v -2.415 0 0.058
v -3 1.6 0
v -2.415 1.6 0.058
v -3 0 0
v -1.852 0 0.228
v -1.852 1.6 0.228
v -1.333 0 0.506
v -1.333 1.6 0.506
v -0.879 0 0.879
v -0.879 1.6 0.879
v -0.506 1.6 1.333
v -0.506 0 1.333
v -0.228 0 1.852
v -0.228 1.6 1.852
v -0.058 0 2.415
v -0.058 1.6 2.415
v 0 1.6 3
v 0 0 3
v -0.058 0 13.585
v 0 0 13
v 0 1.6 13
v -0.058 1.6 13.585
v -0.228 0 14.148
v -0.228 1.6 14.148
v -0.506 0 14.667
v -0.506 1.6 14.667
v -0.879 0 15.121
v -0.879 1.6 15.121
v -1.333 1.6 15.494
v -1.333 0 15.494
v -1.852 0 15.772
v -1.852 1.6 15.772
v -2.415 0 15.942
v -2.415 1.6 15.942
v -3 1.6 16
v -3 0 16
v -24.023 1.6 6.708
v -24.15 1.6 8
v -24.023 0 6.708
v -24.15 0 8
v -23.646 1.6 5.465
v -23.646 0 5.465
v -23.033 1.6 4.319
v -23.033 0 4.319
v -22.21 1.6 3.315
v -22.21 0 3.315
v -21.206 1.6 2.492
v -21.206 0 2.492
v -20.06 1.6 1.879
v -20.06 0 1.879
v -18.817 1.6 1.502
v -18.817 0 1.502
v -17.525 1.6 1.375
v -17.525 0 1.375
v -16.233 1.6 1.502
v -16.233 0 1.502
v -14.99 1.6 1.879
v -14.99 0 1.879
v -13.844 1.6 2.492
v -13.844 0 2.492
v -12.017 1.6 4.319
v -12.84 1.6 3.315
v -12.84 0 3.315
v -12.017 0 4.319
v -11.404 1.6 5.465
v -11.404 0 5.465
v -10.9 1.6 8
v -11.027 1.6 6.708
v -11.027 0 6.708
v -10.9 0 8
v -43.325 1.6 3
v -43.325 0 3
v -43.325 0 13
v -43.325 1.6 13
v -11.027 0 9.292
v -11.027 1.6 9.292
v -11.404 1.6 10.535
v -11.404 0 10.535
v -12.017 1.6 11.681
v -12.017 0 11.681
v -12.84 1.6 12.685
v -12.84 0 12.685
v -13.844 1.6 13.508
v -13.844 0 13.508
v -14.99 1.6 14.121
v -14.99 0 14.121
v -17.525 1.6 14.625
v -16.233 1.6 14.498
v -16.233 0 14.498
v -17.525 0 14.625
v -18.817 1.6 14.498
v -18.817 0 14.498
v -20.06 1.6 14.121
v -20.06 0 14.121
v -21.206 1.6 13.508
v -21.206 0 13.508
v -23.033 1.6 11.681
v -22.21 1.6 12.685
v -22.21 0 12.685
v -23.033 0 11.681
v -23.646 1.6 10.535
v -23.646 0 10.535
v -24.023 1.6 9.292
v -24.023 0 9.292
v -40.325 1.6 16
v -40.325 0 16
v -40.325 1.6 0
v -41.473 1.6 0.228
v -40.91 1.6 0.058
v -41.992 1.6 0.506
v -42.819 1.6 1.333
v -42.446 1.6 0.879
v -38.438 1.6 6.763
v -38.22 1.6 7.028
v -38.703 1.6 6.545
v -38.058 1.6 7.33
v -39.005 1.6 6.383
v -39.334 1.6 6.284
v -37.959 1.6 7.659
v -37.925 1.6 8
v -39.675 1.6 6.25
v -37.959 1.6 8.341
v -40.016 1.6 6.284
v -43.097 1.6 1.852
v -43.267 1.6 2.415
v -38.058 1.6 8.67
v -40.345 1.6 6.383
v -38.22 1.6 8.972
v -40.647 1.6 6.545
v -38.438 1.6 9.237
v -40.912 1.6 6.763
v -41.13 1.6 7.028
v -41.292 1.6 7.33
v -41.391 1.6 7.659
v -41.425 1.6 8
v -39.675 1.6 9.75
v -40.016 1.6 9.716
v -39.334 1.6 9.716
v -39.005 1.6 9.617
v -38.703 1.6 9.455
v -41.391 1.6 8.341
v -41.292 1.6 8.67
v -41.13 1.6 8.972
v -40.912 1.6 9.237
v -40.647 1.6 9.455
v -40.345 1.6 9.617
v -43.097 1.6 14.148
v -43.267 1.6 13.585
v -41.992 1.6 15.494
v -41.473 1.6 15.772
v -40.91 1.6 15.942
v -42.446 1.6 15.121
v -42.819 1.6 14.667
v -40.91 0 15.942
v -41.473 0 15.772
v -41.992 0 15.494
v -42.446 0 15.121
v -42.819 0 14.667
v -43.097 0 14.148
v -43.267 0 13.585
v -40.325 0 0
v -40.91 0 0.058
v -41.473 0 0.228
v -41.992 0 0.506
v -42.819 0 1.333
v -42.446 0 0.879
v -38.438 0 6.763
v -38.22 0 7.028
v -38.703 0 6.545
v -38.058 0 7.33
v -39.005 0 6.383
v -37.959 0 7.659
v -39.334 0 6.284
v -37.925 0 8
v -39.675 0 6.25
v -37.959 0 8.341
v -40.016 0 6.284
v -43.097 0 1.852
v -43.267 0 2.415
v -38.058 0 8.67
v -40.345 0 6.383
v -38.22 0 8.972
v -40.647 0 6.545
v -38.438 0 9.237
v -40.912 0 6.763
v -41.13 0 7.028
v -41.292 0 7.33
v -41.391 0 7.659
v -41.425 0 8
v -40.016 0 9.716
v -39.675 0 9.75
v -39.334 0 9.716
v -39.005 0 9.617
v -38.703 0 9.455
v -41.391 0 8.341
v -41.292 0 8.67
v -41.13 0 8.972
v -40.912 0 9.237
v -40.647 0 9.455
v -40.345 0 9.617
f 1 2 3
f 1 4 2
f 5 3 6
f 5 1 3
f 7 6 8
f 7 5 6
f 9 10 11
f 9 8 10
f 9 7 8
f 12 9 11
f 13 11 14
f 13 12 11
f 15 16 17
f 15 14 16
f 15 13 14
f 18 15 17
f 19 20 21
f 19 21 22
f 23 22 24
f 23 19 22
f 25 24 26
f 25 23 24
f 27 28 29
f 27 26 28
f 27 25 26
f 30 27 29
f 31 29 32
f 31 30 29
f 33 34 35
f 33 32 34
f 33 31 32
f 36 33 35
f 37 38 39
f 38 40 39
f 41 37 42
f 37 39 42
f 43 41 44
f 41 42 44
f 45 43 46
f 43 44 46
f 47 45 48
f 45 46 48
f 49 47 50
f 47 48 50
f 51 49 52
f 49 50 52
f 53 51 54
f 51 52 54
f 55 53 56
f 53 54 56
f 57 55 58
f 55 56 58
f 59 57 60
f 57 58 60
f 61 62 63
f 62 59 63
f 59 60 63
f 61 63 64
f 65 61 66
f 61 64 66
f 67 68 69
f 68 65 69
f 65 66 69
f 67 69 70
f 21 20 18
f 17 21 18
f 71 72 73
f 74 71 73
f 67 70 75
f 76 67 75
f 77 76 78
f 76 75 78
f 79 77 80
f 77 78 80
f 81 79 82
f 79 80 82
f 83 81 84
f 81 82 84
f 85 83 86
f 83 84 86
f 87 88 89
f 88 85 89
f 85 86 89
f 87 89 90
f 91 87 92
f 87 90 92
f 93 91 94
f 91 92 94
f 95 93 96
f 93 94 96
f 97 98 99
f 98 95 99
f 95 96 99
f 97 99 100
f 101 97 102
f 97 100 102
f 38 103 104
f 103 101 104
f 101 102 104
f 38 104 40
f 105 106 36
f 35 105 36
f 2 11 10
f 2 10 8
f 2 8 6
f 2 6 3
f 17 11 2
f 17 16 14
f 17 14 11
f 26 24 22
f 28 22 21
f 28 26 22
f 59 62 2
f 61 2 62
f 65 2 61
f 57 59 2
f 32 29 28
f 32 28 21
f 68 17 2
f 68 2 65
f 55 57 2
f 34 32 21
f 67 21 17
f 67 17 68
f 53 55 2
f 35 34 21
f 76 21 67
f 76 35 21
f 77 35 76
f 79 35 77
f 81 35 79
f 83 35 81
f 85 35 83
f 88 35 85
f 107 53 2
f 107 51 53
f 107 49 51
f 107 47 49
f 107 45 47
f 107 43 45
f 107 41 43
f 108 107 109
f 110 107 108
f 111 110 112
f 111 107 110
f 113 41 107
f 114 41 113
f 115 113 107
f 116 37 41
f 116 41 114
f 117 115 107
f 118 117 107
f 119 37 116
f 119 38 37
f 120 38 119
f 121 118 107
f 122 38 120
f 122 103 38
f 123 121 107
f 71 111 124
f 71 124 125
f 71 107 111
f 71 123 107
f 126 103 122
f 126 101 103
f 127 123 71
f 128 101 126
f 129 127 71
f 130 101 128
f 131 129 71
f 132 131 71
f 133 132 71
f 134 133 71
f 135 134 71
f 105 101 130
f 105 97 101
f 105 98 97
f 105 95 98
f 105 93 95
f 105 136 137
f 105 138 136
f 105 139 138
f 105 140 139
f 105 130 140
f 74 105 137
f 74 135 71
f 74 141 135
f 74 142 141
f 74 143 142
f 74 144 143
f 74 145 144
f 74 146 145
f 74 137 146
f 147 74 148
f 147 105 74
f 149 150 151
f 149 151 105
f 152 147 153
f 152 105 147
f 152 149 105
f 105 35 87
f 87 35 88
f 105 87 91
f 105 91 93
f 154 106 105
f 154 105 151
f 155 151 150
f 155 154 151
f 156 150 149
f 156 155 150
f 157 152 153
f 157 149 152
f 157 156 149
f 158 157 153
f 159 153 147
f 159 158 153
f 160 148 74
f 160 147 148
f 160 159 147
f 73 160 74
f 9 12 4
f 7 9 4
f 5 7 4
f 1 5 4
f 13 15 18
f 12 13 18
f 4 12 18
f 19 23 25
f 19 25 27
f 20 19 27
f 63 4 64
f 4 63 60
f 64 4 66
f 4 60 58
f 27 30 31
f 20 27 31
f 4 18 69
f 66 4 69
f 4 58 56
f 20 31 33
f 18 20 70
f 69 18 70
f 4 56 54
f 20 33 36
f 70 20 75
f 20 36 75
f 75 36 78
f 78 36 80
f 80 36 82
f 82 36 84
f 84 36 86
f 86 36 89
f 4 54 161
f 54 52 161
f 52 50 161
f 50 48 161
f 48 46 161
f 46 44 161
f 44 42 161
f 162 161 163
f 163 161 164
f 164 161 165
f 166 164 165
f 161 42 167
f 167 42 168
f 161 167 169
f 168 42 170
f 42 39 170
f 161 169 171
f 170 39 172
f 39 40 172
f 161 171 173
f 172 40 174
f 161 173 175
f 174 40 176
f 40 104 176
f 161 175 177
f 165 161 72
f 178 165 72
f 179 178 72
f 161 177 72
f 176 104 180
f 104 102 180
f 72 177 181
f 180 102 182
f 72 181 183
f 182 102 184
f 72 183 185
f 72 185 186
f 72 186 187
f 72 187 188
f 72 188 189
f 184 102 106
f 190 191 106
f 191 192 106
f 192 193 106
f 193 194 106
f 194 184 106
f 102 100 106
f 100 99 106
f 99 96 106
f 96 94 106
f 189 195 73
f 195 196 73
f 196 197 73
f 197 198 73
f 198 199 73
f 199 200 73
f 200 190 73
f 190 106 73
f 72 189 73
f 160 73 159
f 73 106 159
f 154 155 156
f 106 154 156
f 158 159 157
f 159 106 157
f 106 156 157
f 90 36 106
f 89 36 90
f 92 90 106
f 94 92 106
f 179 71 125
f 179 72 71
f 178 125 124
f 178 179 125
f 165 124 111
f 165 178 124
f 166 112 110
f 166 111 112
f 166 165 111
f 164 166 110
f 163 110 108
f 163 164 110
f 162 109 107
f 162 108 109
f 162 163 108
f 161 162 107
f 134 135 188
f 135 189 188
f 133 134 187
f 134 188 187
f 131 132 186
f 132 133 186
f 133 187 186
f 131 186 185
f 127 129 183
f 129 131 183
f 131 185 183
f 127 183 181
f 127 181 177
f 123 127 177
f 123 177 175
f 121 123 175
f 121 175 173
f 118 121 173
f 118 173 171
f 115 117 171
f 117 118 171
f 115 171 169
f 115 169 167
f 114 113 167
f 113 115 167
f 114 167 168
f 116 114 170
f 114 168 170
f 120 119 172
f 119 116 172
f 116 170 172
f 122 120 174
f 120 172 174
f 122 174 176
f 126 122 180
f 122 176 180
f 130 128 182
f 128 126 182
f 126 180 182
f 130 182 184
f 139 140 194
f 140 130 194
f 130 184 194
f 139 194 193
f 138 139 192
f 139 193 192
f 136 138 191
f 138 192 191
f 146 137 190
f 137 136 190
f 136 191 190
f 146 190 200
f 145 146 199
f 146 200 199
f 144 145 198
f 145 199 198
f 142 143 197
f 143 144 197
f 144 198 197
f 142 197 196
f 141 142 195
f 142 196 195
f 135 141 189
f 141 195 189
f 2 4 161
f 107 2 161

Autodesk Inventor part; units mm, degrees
ref_plane "YZ Plane" through (0, 0, 0) normal (1, 0, 0) x (0, 1, 0)
ref_plane "XZ Plane" through (0, 0, 0) normal (0, 1, 0) x (-1, 0, 0)
ref_plane "XY Plane" through (0, 0, 0) normal (0, 0, 1) x (1, 0, 0)
sketch "Sketch1" plane through (0, 0, 0) normal (0, 1, 0) x (-1, 0, 0)
  line L0 (3, 0) -> (40.325, 0)
  line L1 (43.325, 3) -> (43.325, 13)
  line L2 (40.325, 16) -> (3, 16)
  line L3 (0, 13) -> (0, 3)
  circle A0 centre (17.525, 8) radius 6.625
  arc A1 (3, 16) -> (0, 13) centre (3, 13) ccw
  arc A2 (0, 3) -> (3, 0) centre (3, 3) ccw
  arc A3 (40.325, 0) -> (43.325, 3) centre (40.325, 3) ccw
  arc A4 (43.325, 13) -> (40.325, 16) centre (40.325, 13) ccw
  line L4 (10.9, 8) -> (17.525, 8)
  circle A5 centre (39.675, 8) radius 1.75
  point P0 (0, 0)
  point P1 (43.325, 16)
  point P2 (43.325, 0)
  point P3 (0, 16)
  dimension "d0" = 13.25
  dimension "d1" = 16
  dimension "d9" = 3
  dimension "d20" = 8
  dimension "d22" = 25.8
  dimension "d24" = 10.9
  dimension "d25" = 3.5
  dimension "d26" = 3.65
extrude "Extrusion1" add sketch "Sketch1" along normal blind 1.6
properties part number "PCBAux"
